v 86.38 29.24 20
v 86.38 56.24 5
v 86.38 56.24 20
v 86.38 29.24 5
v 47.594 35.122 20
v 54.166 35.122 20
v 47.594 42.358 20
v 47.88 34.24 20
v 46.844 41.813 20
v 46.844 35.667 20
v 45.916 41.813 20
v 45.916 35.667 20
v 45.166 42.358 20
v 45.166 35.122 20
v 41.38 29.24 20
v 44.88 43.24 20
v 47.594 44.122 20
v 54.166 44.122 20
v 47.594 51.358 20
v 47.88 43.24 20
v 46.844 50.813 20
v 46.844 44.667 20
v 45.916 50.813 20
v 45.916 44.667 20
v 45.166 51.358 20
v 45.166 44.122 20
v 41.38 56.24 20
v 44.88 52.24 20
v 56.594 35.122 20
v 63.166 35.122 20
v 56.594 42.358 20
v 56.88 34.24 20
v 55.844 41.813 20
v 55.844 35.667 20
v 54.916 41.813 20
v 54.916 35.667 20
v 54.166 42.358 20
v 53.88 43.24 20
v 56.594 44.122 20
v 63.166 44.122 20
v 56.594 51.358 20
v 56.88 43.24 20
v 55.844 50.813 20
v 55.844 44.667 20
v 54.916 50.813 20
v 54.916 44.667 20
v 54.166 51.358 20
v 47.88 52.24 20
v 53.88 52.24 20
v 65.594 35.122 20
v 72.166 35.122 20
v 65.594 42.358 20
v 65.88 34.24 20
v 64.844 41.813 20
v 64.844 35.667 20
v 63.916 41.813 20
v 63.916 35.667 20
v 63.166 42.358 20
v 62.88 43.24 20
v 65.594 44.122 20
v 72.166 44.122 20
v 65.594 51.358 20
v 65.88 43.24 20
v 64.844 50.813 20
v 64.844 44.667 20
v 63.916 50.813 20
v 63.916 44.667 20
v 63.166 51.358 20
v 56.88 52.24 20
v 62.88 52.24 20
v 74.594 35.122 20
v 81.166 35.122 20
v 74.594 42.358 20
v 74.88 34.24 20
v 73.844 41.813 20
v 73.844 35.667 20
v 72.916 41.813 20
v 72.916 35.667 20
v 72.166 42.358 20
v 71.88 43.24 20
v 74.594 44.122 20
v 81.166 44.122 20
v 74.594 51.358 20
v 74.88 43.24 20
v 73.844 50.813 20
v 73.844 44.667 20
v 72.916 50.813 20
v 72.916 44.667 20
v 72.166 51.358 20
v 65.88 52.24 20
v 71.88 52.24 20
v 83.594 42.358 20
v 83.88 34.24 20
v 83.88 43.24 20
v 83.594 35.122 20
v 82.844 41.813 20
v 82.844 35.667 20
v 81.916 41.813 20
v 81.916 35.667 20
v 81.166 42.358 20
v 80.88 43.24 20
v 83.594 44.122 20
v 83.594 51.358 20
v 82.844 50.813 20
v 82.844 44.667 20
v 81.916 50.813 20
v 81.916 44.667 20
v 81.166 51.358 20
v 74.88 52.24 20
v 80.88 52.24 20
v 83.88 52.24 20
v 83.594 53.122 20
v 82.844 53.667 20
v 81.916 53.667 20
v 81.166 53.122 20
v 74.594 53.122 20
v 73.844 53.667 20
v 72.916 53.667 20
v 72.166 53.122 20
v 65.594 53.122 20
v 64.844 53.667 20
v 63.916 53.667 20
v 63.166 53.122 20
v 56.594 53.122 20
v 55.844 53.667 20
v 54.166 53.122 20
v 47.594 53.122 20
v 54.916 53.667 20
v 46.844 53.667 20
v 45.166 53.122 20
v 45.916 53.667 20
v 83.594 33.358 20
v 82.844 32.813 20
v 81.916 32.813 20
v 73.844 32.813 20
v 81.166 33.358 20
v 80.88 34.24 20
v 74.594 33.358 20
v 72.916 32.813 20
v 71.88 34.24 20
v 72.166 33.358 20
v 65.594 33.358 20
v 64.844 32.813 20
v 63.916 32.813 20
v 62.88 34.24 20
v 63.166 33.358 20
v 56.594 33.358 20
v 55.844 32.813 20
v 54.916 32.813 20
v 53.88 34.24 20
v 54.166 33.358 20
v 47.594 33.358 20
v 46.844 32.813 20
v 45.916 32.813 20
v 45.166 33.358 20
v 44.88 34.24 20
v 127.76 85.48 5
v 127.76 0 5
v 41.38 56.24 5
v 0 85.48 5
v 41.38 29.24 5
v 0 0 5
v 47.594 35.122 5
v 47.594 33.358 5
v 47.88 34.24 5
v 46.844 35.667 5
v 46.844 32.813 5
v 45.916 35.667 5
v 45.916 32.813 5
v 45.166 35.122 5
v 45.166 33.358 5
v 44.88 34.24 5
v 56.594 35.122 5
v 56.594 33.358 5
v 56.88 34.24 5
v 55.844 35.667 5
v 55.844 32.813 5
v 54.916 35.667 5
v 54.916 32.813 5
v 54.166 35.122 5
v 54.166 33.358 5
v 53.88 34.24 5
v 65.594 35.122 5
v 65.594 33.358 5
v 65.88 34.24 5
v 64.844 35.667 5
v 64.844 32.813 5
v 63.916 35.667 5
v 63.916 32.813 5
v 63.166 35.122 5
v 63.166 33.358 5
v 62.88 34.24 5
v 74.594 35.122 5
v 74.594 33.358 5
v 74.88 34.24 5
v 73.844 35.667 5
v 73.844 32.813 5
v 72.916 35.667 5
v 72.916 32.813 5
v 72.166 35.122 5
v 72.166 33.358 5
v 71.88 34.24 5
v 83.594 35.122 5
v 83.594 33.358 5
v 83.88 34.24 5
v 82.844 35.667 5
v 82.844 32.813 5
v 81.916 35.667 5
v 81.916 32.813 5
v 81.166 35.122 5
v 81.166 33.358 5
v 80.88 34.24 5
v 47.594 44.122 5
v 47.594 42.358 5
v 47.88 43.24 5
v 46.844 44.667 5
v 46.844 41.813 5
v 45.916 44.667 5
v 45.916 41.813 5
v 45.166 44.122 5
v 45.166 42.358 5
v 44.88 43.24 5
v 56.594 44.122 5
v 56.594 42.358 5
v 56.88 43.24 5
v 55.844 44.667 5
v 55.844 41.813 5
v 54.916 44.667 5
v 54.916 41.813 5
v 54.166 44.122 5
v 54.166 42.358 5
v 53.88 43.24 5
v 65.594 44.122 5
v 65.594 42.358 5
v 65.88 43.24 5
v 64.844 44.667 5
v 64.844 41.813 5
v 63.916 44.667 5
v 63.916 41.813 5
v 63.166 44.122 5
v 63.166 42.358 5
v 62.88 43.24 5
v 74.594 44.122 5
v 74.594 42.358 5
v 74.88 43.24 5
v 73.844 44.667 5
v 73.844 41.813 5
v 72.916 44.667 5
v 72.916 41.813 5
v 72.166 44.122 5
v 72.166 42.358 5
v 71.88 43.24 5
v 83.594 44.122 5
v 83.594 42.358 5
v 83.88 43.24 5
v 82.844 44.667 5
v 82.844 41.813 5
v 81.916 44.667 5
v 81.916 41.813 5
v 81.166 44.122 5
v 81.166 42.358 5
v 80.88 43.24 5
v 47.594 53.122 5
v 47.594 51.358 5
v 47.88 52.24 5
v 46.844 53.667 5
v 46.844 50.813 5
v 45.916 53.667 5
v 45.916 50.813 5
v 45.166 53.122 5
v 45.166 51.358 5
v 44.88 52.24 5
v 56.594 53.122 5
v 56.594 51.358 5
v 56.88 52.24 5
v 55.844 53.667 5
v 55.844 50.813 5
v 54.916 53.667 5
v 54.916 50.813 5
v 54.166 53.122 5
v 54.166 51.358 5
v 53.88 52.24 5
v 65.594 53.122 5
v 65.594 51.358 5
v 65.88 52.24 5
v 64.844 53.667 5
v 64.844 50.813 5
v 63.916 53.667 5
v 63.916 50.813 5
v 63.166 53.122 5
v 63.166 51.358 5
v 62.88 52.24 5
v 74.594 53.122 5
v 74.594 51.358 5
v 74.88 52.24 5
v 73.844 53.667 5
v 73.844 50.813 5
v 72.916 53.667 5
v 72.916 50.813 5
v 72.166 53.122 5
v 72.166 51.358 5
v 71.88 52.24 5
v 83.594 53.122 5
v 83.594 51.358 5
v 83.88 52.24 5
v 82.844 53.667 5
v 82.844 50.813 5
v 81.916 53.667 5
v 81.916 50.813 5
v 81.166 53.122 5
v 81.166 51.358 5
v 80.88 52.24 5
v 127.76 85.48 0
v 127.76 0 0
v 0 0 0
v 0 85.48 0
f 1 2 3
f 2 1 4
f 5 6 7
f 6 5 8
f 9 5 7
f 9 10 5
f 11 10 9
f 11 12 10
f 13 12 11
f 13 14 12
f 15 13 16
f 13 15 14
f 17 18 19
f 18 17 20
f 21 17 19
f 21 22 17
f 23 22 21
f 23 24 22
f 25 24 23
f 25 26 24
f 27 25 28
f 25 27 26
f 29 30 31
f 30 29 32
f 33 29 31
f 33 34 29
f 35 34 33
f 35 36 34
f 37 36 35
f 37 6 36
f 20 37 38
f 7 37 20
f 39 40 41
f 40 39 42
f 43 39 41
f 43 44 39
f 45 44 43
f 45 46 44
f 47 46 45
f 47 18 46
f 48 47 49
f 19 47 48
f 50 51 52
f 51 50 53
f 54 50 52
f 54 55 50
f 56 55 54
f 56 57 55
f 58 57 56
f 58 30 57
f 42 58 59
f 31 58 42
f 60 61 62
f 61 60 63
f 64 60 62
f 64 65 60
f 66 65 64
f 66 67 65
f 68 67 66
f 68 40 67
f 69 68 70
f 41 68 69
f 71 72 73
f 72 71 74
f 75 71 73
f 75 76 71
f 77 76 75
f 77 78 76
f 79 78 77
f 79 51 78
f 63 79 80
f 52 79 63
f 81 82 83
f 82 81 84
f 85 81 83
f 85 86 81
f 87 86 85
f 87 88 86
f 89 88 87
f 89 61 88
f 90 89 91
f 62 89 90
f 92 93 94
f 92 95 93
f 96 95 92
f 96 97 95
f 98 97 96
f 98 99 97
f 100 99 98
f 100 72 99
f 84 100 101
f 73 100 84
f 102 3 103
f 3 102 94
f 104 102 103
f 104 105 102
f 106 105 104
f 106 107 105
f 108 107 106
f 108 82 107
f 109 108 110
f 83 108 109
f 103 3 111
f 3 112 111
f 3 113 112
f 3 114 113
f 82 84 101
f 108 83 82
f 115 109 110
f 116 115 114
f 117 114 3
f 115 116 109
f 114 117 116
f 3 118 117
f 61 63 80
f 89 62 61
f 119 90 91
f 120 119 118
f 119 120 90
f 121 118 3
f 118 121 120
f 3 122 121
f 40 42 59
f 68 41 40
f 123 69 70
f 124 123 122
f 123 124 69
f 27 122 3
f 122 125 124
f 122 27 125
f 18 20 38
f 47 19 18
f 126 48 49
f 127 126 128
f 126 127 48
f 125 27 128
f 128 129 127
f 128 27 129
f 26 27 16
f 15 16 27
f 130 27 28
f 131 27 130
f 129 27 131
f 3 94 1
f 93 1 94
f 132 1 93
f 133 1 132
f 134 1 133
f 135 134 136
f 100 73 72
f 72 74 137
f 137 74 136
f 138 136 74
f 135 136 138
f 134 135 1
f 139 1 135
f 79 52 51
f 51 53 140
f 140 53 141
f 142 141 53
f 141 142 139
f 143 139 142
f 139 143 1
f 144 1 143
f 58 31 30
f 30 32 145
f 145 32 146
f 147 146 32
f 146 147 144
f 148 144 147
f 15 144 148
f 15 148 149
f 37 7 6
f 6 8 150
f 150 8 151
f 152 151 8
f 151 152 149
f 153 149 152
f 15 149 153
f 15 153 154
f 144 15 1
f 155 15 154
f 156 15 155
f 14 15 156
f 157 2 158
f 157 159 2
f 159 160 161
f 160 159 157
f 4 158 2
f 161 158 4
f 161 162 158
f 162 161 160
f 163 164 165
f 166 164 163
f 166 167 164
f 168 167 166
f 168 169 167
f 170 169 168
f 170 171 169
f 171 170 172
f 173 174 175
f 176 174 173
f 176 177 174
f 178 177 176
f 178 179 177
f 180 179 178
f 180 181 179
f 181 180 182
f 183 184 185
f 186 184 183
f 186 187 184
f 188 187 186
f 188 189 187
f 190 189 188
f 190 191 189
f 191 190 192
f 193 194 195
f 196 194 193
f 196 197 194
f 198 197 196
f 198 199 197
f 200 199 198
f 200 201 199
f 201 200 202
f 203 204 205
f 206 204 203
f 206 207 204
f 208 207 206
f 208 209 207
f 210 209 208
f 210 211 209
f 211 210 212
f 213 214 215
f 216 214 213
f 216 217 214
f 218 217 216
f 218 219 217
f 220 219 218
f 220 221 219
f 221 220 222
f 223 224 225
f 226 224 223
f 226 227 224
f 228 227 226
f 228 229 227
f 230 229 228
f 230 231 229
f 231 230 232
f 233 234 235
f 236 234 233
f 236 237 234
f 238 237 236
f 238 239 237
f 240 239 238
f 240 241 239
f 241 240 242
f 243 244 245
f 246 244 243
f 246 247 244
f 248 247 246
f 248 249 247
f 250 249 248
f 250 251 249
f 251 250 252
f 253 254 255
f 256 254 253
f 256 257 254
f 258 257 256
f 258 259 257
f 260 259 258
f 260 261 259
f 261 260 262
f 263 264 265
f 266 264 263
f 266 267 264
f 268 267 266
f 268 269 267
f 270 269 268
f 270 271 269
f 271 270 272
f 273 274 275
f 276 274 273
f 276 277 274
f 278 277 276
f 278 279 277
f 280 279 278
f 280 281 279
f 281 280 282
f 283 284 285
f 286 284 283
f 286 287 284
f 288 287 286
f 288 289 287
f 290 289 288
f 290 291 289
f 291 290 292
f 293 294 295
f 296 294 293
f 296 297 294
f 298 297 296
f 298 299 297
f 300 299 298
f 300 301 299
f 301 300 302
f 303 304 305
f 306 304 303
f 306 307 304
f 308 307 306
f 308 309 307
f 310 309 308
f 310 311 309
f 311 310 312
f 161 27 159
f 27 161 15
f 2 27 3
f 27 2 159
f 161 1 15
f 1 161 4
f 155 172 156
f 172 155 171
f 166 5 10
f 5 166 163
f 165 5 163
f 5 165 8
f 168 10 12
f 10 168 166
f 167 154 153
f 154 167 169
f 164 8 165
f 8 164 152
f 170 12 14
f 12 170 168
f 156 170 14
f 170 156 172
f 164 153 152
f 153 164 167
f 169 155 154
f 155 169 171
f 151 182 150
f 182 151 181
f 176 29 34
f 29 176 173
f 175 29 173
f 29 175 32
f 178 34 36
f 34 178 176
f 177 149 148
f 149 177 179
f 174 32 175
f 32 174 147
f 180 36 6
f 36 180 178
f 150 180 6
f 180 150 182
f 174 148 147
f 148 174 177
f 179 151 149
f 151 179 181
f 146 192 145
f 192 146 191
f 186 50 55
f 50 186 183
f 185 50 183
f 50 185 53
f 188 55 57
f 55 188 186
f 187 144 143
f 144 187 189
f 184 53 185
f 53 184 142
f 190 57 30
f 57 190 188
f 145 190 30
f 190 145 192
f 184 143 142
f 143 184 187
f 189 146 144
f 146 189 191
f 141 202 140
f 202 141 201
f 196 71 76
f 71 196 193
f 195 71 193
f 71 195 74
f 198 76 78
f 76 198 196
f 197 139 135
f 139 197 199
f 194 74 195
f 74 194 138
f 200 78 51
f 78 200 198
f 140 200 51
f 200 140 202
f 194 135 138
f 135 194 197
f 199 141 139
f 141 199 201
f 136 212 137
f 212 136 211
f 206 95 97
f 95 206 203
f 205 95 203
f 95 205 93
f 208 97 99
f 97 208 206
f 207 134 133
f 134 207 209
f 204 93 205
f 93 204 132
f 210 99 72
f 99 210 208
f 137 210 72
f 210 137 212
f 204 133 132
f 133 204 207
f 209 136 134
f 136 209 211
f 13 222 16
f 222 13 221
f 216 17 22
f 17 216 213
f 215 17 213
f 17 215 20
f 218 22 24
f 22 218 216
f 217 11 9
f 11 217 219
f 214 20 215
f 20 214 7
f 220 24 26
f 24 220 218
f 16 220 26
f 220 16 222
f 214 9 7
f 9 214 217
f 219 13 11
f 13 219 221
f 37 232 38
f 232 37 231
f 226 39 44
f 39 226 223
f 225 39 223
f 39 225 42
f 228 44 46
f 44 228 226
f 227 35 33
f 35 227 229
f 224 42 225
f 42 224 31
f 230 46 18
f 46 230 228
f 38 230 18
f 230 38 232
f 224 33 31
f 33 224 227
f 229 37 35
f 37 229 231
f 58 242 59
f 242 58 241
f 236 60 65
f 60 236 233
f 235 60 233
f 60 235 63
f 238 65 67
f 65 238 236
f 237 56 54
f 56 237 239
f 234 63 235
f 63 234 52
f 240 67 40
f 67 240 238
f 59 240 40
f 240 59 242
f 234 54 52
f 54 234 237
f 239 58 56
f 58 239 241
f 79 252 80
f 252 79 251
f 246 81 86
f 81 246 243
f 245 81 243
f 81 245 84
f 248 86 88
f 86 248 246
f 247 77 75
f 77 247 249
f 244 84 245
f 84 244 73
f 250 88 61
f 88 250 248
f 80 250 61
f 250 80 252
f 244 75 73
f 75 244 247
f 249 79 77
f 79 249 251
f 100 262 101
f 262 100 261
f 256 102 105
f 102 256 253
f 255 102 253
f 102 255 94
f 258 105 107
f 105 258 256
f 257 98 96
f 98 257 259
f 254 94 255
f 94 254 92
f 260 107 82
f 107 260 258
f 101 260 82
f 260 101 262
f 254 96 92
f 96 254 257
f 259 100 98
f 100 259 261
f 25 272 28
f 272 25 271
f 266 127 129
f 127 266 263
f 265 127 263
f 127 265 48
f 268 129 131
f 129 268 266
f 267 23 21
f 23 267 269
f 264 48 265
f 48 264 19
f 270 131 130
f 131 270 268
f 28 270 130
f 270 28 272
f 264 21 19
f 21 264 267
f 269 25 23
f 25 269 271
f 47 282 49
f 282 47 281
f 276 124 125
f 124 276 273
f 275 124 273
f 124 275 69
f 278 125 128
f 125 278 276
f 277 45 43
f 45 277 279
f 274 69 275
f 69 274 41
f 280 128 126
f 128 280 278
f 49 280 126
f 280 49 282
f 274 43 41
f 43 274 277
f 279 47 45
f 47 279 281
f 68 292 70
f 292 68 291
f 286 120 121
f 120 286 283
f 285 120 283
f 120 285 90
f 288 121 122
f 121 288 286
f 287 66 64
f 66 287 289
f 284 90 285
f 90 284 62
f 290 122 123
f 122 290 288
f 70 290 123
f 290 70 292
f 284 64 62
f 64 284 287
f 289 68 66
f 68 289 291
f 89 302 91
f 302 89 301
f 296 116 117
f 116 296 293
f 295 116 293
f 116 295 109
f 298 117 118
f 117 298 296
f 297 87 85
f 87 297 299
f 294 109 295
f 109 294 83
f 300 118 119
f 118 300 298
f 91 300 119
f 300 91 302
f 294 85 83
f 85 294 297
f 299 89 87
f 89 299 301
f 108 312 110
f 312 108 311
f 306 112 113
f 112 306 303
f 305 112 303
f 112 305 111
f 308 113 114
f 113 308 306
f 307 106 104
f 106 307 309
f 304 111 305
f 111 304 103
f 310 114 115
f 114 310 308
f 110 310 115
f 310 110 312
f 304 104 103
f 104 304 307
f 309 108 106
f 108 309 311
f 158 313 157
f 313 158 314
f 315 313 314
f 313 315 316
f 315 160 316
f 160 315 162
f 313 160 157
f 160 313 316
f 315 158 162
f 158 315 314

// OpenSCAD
    base_length = 127.76;
    base_width = 85.48;
    base_height = 5;

    module sbs_plate() {
        // Main cube
        cube([base_length, base_width, base_height], center=false);
    }

    module rectangular_holder() {
        holder_length = 45.0;
        holder_width = 27.0;
        holder_height = 15;
        tube_diameter = 3;

        // Begin removing the hole cutouts:
        difference() {
            translate([base_length/2 - holder_length/2, base_width/2 - holder_width/2, base_height]) {
                // First create the holder rectangle & translate to center:
                cube([holder_length, holder_width, holder_height], center=false);
            }

            // Cutouts:
            
            translate([46.38, 34.24, 5]) {
                cylinder(h=15.5, d=3, center=false, $fn=10);
            }
        
            translate([55.38, 34.24, 5]) {
                cylinder(h=15.5, d=3, center=false, $fn=10);
            }
        
            translate([64.38, 34.24, 5]) {
                cylinder(h=15.5, d=3, center=false, $fn=10);
            }
        
            translate([73.38, 34.24, 5]) {
                cylinder(h=15.5, d=3, center=false, $fn=10);
            }
        
            translate([82.38, 34.24, 5]) {
                cylinder(h=15.5, d=3, center=false, $fn=10);
            }
        
            translate([46.38, 43.24, 5]) {
                cylinder(h=15.5, d=3, center=false, $fn=10);
            }
        
            translate([55.38, 43.24, 5]) {
                cylinder(h=15.5, d=3, center=false, $fn=10);
            }
        
            translate([64.38, 43.24, 5]) {
                cylinder(h=15.5, d=3, center=false, $fn=10);
            }
        
            translate([73.38, 43.24, 5]) {
                cylinder(h=15.5, d=3, center=false, $fn=10);
            }
        
            translate([82.38, 43.24, 5]) {
                cylinder(h=15.5, d=3, center=false, $fn=10);
            }
        
            translate([46.38, 52.24, 5]) {
                cylinder(h=15.5, d=3, center=false, $fn=10);
            }
        
            translate([55.38, 52.24, 5]) {
                cylinder(h=15.5, d=3, center=false, $fn=10);
            }
        
            translate([64.38, 52.24, 5]) {
                cylinder(h=15.5, d=3, center=false, $fn=10);
            }
        
            translate([73.38, 52.24, 5]) {
                cylinder(h=15.5, d=3, center=false, $fn=10);
            }
        
            translate([82.38, 52.24, 5]) {
                cylinder(h=15.5, d=3, center=false, $fn=10);
            }
        
            }
        }
        
    sbs_plate();
    rectangular_holder();
    
